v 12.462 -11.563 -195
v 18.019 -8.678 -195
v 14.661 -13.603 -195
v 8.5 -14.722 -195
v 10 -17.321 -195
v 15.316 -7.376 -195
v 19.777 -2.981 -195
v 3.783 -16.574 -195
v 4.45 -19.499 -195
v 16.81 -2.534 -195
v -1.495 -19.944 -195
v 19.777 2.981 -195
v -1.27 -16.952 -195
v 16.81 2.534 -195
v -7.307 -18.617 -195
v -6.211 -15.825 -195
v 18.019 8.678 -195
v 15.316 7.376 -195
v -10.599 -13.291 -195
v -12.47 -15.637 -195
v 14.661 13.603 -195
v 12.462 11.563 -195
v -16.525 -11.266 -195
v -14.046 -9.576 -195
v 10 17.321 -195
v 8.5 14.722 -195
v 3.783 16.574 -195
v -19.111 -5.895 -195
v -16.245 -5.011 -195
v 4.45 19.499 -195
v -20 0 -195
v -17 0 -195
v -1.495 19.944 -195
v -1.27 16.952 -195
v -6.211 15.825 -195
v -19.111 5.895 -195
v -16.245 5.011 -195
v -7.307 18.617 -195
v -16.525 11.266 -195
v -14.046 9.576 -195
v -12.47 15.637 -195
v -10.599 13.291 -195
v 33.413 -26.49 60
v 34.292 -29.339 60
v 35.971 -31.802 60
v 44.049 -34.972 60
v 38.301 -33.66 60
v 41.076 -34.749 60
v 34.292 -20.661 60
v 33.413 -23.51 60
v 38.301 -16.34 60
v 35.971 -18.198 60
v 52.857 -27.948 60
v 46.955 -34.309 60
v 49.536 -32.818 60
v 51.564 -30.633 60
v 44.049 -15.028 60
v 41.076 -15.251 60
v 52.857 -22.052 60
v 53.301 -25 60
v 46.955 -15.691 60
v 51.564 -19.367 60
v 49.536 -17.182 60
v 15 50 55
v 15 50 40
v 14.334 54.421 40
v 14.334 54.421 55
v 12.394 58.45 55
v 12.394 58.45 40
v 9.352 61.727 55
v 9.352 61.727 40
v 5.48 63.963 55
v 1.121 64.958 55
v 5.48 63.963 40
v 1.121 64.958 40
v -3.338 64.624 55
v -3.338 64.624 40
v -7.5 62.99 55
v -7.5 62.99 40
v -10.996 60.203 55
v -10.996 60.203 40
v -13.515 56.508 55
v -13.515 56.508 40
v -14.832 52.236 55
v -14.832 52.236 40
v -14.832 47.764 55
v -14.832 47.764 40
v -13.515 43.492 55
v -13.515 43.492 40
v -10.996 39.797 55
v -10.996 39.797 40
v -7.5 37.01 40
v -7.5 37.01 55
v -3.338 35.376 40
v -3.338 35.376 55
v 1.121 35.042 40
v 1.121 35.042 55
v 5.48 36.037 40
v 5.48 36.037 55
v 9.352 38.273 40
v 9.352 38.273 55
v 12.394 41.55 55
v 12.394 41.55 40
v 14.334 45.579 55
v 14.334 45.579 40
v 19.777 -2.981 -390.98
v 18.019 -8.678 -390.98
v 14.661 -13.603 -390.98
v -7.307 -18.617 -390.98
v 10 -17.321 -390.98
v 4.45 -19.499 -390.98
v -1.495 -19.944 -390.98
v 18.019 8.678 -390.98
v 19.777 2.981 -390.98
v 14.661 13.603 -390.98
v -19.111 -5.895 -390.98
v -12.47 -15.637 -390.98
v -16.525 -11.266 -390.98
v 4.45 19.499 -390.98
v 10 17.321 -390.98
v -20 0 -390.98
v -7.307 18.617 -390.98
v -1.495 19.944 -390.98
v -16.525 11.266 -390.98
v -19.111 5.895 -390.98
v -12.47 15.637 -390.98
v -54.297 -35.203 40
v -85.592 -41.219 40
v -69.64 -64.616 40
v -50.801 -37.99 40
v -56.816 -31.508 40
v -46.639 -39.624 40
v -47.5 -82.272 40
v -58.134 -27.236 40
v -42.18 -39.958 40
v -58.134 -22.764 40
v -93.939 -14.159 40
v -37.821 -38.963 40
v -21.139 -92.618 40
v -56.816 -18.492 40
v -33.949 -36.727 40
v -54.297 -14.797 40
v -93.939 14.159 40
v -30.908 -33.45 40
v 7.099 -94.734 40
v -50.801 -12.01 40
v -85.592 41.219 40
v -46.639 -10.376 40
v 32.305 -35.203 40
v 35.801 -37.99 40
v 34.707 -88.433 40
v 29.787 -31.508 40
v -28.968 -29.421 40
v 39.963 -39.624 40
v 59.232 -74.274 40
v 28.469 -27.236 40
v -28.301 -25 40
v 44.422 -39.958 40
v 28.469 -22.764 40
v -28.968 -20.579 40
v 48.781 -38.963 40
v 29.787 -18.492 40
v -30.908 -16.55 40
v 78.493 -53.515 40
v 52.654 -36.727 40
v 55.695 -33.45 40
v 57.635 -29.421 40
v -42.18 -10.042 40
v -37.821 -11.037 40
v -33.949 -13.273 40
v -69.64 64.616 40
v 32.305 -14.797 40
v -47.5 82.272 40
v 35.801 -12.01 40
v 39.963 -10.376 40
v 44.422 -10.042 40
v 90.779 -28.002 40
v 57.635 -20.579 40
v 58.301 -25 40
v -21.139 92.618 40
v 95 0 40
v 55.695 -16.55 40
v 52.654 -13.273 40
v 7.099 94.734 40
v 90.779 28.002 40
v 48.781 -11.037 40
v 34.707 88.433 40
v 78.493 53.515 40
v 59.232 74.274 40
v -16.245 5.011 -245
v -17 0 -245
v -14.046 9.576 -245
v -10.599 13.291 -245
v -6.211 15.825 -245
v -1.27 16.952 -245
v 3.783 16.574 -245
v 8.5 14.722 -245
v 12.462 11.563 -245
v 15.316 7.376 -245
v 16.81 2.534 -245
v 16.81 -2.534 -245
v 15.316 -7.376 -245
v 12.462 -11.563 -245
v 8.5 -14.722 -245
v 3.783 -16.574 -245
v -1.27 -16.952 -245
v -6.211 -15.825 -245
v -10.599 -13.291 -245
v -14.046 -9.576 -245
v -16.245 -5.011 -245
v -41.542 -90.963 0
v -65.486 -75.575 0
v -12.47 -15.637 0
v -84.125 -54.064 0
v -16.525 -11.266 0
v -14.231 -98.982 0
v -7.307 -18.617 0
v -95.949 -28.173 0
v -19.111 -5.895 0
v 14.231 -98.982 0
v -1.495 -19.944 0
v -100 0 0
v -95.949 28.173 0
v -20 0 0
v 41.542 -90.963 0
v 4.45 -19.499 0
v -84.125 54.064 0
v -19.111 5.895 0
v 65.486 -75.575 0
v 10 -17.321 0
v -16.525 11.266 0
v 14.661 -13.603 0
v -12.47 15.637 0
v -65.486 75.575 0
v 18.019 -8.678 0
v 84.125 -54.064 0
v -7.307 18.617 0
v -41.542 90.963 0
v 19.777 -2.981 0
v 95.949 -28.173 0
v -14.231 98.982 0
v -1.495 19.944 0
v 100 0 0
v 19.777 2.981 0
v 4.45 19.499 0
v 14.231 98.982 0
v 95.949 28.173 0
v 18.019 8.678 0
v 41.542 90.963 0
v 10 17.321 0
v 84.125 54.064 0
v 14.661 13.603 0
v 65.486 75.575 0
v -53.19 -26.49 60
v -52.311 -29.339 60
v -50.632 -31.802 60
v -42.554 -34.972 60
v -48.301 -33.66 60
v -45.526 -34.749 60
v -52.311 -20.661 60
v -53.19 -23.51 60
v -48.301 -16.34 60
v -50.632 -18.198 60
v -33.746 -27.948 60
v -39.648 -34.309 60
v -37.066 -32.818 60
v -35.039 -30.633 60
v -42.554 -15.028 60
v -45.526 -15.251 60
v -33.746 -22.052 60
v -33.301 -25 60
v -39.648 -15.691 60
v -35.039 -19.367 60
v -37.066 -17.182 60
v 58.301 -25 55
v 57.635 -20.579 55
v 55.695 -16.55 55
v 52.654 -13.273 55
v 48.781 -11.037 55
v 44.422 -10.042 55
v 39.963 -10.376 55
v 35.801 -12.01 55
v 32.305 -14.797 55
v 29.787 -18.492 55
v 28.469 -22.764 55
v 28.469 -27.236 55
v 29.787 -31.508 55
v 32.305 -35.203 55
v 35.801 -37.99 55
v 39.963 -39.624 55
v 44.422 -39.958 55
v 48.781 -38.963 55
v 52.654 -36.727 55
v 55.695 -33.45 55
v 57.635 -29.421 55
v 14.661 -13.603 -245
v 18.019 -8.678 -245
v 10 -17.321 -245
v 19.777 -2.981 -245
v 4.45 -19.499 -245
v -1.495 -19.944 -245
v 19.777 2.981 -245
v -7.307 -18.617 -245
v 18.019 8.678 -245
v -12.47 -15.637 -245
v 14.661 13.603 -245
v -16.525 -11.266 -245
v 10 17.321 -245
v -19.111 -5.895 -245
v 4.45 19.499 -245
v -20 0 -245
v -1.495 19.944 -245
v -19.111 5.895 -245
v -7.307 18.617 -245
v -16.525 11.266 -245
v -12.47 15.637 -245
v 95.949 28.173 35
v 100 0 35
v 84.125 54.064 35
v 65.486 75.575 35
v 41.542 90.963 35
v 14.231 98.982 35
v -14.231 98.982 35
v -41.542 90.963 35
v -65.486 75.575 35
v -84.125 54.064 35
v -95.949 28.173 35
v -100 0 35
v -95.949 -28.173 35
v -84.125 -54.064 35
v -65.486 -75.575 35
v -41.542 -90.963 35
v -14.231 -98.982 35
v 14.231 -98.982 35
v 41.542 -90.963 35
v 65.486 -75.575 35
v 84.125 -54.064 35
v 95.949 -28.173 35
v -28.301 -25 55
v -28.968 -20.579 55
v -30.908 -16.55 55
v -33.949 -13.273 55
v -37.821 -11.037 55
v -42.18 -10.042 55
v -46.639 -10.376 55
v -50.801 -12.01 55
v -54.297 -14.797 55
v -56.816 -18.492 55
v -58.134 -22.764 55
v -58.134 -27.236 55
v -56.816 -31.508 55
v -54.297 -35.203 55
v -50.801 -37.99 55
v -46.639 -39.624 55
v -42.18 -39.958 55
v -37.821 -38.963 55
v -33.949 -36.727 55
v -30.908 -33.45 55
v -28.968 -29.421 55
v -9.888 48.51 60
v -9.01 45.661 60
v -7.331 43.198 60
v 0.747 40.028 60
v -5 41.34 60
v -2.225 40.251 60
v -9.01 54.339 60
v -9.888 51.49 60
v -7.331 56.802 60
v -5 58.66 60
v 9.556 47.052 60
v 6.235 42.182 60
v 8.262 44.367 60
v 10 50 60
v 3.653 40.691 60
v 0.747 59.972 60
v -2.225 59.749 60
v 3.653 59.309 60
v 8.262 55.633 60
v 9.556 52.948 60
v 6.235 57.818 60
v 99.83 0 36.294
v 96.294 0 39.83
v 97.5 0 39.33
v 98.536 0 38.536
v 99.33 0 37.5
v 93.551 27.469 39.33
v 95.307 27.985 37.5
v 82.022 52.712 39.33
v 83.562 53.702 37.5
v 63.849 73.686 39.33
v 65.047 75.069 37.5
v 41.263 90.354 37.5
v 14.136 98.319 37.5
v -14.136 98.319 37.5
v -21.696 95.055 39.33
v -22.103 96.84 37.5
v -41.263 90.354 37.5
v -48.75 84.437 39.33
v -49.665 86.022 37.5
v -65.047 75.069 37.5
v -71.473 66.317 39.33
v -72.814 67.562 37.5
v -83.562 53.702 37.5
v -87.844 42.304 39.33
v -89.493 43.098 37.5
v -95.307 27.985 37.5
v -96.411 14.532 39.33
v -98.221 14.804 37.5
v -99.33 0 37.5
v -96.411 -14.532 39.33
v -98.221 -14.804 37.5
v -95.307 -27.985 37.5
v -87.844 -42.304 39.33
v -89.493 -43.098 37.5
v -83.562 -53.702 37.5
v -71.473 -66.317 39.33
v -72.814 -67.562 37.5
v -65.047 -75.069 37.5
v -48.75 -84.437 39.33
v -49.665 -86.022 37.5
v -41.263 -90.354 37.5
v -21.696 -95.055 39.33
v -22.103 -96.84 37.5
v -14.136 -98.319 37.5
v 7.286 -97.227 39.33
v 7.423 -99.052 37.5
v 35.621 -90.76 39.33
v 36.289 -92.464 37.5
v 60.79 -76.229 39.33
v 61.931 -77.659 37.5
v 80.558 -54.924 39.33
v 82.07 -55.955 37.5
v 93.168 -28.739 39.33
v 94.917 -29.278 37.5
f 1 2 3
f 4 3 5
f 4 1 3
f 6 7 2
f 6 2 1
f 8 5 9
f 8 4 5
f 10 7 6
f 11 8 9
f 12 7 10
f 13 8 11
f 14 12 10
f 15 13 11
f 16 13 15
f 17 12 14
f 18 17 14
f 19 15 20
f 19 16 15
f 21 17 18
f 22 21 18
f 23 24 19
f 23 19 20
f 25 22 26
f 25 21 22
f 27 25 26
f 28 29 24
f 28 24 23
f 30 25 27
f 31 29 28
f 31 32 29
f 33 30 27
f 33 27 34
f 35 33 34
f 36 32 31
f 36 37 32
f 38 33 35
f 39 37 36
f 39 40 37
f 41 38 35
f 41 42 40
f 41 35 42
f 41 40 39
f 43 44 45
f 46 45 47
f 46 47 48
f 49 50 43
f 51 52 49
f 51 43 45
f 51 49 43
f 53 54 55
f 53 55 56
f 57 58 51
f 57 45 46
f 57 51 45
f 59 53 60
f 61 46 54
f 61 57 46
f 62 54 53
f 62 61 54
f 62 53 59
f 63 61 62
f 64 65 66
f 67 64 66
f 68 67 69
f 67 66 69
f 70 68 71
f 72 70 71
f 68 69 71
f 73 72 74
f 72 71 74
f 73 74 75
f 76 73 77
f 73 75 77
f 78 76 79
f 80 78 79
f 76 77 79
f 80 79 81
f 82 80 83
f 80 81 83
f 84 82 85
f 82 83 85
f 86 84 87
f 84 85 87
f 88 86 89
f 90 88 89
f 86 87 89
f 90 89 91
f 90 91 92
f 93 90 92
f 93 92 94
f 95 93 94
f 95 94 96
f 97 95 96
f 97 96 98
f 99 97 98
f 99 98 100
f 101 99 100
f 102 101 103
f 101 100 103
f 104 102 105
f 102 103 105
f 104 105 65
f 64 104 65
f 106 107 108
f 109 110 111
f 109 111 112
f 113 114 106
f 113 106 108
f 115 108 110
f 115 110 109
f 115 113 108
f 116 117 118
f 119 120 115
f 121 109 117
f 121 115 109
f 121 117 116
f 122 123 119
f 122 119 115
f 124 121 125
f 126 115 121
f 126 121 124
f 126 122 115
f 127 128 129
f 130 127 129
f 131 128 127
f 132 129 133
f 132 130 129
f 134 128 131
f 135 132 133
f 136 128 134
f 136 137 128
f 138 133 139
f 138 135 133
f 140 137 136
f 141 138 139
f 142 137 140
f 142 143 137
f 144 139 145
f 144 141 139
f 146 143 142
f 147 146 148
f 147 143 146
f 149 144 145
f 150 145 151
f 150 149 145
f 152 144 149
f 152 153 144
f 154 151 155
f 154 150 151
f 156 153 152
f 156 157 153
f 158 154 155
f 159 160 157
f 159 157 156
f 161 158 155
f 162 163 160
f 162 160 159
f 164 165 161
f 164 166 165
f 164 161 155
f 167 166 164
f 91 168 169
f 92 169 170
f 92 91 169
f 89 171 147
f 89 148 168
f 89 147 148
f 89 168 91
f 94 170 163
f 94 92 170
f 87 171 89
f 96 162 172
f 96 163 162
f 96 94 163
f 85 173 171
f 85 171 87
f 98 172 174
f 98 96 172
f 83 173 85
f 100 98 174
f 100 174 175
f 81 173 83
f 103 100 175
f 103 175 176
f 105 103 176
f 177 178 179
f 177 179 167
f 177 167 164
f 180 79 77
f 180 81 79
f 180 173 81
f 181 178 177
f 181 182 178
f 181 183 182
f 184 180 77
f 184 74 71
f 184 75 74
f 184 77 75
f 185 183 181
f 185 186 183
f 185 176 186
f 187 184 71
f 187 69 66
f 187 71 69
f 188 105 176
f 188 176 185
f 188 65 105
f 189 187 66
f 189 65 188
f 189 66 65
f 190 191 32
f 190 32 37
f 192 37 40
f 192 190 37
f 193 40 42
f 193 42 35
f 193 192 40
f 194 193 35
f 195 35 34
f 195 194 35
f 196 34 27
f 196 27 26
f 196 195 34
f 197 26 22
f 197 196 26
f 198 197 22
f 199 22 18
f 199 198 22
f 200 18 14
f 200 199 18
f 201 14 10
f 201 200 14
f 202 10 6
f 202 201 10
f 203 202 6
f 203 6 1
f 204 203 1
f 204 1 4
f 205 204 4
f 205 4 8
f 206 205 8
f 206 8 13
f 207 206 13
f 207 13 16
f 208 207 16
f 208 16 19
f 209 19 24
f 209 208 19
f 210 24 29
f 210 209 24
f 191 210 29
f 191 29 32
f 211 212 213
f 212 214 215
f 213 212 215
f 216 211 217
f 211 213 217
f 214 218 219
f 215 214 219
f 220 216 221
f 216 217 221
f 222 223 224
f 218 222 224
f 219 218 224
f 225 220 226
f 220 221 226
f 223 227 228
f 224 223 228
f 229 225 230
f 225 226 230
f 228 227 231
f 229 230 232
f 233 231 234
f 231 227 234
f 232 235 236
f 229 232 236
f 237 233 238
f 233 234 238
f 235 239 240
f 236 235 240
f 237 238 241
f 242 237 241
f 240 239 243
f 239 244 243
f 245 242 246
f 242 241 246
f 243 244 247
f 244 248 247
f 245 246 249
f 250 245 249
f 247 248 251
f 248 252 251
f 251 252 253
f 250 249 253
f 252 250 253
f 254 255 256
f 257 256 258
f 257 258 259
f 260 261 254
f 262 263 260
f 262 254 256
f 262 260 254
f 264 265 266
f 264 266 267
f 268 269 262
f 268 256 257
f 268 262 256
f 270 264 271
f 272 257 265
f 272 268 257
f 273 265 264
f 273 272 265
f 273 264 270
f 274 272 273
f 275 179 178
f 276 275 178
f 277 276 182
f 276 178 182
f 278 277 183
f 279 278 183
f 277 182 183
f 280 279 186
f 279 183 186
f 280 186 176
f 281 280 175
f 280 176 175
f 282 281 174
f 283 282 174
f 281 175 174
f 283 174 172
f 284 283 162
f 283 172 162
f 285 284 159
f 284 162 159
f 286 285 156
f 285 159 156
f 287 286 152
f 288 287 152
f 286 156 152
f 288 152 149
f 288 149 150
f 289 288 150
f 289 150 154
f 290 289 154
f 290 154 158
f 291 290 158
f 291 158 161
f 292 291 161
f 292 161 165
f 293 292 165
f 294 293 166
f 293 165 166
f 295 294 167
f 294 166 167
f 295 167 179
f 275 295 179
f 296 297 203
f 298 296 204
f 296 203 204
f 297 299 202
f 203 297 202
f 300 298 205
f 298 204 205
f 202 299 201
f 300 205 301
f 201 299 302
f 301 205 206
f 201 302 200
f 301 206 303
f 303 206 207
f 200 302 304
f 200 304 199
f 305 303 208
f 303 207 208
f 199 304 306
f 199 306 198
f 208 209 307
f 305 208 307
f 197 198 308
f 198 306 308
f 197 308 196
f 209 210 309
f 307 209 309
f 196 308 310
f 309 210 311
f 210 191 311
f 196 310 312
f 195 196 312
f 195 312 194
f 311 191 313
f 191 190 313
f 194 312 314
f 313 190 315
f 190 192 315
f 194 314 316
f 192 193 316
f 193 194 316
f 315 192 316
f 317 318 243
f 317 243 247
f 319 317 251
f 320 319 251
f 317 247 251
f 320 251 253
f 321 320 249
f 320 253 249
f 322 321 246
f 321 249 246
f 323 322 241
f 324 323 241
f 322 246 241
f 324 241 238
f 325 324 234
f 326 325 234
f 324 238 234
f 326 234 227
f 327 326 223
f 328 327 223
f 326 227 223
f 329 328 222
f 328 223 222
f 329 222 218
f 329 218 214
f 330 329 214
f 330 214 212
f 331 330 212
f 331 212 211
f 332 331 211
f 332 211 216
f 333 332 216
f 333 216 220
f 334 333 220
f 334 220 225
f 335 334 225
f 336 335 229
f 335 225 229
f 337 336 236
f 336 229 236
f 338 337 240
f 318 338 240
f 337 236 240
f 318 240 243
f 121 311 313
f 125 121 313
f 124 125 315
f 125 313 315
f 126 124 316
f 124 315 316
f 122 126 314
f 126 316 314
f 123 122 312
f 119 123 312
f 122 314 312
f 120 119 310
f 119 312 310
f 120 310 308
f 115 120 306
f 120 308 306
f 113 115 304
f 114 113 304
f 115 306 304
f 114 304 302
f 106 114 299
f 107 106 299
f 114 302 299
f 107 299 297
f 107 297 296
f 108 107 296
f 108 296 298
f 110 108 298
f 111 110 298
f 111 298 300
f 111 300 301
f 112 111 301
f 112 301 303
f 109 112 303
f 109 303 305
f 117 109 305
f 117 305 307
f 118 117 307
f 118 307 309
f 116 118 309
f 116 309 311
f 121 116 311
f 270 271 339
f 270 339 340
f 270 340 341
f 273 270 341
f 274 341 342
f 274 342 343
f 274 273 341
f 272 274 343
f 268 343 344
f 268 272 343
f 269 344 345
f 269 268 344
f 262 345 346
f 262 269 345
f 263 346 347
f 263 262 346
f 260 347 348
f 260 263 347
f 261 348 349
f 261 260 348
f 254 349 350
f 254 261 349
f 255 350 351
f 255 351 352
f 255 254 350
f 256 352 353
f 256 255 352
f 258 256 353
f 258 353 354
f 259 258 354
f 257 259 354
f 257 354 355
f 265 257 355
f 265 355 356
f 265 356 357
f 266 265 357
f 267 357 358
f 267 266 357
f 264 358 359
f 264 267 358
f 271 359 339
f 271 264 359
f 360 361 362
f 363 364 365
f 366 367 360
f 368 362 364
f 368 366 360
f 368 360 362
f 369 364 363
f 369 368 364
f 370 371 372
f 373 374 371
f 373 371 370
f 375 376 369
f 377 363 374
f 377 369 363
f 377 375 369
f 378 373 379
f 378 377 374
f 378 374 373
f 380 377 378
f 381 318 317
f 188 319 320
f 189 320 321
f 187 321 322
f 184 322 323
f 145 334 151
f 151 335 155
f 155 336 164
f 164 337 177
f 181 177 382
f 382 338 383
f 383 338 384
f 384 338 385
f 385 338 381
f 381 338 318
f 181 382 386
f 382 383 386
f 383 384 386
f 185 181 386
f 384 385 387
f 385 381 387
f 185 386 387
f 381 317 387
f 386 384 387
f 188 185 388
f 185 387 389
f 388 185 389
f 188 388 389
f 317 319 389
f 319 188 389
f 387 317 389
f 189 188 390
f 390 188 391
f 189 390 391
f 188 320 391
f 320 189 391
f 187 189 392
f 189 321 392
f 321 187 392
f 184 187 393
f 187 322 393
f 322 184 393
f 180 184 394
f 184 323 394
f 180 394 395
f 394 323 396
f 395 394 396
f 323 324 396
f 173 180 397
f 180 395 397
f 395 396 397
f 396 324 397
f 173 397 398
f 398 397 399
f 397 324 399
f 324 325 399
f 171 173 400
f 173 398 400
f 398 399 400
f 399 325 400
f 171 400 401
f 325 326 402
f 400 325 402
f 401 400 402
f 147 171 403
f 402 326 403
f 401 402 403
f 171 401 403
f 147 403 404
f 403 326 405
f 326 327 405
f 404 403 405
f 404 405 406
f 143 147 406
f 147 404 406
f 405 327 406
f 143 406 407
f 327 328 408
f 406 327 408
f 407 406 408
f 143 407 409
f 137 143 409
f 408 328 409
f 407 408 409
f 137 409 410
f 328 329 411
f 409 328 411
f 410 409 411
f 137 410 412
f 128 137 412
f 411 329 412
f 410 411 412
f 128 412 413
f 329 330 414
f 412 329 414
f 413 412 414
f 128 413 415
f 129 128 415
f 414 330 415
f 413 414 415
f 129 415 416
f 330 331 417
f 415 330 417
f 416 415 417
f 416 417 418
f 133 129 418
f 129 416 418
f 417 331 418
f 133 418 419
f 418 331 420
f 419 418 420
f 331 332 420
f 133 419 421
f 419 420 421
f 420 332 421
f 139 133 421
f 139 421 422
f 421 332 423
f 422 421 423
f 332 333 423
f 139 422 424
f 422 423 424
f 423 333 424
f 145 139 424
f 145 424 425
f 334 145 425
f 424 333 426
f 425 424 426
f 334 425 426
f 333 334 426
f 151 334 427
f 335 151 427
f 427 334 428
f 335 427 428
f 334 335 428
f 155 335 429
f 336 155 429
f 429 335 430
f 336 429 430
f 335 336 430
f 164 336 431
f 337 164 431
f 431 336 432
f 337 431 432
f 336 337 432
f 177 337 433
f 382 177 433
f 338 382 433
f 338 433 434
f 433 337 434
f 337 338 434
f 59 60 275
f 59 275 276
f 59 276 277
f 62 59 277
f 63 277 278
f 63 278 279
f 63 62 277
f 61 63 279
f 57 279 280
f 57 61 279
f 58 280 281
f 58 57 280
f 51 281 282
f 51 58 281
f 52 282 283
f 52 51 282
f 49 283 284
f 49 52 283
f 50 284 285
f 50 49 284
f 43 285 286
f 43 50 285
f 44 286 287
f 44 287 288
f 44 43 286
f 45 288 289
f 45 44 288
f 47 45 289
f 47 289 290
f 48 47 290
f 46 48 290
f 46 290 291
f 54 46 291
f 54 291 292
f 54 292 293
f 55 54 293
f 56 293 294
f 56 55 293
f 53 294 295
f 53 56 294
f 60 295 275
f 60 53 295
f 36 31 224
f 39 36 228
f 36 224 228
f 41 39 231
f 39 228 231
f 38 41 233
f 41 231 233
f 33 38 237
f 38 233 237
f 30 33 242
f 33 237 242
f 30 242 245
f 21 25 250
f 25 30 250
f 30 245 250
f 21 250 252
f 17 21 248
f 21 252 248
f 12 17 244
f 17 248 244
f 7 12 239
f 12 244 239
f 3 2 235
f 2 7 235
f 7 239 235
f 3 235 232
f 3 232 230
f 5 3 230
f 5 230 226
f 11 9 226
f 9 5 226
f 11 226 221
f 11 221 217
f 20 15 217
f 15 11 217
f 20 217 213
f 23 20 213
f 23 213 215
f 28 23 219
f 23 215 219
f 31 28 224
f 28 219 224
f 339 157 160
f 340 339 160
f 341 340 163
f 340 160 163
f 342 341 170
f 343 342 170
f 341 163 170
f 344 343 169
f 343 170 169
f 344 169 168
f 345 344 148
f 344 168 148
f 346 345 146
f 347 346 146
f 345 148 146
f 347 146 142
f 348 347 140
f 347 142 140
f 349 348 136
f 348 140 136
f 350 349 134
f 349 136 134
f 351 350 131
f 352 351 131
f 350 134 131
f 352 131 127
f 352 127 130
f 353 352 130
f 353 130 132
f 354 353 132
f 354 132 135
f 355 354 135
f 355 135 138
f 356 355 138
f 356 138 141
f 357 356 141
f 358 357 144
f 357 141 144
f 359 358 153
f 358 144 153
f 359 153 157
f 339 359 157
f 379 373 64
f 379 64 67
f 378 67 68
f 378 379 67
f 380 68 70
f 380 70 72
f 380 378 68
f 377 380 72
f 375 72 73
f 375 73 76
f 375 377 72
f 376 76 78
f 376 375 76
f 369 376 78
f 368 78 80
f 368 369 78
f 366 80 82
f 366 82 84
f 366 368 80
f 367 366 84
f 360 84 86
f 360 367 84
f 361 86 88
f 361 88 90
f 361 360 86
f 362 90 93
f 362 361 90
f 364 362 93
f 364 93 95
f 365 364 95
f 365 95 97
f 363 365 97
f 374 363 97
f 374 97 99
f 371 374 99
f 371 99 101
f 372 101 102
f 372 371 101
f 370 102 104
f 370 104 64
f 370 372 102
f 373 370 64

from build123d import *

# Parameters (mm, degrees)
SKETCH1_R           = 100
BOSS_EXTRUDE1_DEPTH = 40
SKETCH2_R           = 15
BOSS_EXTRUDE2_DEPTH = 20
SKETCH3_R           = 20
BOSS_EXTRUDE3_DEPTH = 495
CUT_EXTRUDE1_START  = -250
SKETCH4_OUTSIDE_W   = 326.584
SKETCH4_OUTSIDE_H   = 326.584
SKETCH4_OUTSIDE_R   = 17
CUT_EXTRUDE1_DEPTH  = 50
CHAMFER1_SIZE       = 5
FILLET1_R           = 5
CUT_EXTRUDE2_START  = -104.02
SKETCH5_R           = 20
CUT_EXTRUDE2_DEPTH  = 104.02


with BuildPart() as part:
    # Sketch1 → Boss-Extrude1 (new body)
    with BuildSketch(Plane.XY):
        Circle(SKETCH1_R)
    extrude(amount=BOSS_EXTRUDE1_DEPTH)

    # Sketch2 → Boss-Extrude2 (add)
    with BuildSketch(Plane.XY.offset(40)):
        with Locations((0, 50)):
            Circle(SKETCH2_R)
        with Locations((43.301270189, -25)):
            Circle(SKETCH2_R)
        with Locations((-43.301270189, -25)):
            Circle(SKETCH2_R)
    extrude(amount=BOSS_EXTRUDE2_DEPTH)

    # Sketch3 → Boss-Extrude3 (add)
    with BuildSketch(Plane(origin=(0, 0, 0), x_dir=(-1, 0, 0), z_dir=(0, 0, -1))):
        Circle(SKETCH3_R)
    extrude(amount=BOSS_EXTRUDE3_DEPTH)

    # Sketch4 outside → Cut-Extrude1 (cut)
    with BuildSketch(Plane(origin=(0, 0, -495), x_dir=(-1, 0, 0), z_dir=(0, 0, -1)).offset(CUT_EXTRUDE1_START)):
        Rectangle(SKETCH4_OUTSIDE_W, SKETCH4_OUTSIDE_H)
        Circle(SKETCH4_OUTSIDE_R, mode=Mode.SUBTRACT)
    extrude(amount=-CUT_EXTRUDE1_DEPTH, mode=Mode.SUBTRACT)

    # Chamfer1
    chamfer1_edges = [part.edges().sort_by_distance(p)[0] for p in [
        (-58.301270189, -25, 60),
        (-15, 50, 60),
        (28.301270189, -25, 60),
    ]]
    chamfer(chamfer1_edges, length=CHAMFER1_SIZE)

    # Fillet1
    fillet1_edges = [part.edges().sort_by_distance(p)[0] for p in [
        (-100, 0, 40),
    ]]
    fillet(fillet1_edges, radius=FILLET1_R)

    # Sketch5 → Cut-Extrude2 (cut)
    with BuildSketch(Plane(origin=(0, 0, -495), x_dir=(-1, 0, 0), z_dir=(0, 0, -1)).offset(CUT_EXTRUDE2_START)):
        Circle(SKETCH5_R)
    extrude(amount=CUT_EXTRUDE2_DEPTH, mode=Mode.SUBTRACT)


solid = part.part
